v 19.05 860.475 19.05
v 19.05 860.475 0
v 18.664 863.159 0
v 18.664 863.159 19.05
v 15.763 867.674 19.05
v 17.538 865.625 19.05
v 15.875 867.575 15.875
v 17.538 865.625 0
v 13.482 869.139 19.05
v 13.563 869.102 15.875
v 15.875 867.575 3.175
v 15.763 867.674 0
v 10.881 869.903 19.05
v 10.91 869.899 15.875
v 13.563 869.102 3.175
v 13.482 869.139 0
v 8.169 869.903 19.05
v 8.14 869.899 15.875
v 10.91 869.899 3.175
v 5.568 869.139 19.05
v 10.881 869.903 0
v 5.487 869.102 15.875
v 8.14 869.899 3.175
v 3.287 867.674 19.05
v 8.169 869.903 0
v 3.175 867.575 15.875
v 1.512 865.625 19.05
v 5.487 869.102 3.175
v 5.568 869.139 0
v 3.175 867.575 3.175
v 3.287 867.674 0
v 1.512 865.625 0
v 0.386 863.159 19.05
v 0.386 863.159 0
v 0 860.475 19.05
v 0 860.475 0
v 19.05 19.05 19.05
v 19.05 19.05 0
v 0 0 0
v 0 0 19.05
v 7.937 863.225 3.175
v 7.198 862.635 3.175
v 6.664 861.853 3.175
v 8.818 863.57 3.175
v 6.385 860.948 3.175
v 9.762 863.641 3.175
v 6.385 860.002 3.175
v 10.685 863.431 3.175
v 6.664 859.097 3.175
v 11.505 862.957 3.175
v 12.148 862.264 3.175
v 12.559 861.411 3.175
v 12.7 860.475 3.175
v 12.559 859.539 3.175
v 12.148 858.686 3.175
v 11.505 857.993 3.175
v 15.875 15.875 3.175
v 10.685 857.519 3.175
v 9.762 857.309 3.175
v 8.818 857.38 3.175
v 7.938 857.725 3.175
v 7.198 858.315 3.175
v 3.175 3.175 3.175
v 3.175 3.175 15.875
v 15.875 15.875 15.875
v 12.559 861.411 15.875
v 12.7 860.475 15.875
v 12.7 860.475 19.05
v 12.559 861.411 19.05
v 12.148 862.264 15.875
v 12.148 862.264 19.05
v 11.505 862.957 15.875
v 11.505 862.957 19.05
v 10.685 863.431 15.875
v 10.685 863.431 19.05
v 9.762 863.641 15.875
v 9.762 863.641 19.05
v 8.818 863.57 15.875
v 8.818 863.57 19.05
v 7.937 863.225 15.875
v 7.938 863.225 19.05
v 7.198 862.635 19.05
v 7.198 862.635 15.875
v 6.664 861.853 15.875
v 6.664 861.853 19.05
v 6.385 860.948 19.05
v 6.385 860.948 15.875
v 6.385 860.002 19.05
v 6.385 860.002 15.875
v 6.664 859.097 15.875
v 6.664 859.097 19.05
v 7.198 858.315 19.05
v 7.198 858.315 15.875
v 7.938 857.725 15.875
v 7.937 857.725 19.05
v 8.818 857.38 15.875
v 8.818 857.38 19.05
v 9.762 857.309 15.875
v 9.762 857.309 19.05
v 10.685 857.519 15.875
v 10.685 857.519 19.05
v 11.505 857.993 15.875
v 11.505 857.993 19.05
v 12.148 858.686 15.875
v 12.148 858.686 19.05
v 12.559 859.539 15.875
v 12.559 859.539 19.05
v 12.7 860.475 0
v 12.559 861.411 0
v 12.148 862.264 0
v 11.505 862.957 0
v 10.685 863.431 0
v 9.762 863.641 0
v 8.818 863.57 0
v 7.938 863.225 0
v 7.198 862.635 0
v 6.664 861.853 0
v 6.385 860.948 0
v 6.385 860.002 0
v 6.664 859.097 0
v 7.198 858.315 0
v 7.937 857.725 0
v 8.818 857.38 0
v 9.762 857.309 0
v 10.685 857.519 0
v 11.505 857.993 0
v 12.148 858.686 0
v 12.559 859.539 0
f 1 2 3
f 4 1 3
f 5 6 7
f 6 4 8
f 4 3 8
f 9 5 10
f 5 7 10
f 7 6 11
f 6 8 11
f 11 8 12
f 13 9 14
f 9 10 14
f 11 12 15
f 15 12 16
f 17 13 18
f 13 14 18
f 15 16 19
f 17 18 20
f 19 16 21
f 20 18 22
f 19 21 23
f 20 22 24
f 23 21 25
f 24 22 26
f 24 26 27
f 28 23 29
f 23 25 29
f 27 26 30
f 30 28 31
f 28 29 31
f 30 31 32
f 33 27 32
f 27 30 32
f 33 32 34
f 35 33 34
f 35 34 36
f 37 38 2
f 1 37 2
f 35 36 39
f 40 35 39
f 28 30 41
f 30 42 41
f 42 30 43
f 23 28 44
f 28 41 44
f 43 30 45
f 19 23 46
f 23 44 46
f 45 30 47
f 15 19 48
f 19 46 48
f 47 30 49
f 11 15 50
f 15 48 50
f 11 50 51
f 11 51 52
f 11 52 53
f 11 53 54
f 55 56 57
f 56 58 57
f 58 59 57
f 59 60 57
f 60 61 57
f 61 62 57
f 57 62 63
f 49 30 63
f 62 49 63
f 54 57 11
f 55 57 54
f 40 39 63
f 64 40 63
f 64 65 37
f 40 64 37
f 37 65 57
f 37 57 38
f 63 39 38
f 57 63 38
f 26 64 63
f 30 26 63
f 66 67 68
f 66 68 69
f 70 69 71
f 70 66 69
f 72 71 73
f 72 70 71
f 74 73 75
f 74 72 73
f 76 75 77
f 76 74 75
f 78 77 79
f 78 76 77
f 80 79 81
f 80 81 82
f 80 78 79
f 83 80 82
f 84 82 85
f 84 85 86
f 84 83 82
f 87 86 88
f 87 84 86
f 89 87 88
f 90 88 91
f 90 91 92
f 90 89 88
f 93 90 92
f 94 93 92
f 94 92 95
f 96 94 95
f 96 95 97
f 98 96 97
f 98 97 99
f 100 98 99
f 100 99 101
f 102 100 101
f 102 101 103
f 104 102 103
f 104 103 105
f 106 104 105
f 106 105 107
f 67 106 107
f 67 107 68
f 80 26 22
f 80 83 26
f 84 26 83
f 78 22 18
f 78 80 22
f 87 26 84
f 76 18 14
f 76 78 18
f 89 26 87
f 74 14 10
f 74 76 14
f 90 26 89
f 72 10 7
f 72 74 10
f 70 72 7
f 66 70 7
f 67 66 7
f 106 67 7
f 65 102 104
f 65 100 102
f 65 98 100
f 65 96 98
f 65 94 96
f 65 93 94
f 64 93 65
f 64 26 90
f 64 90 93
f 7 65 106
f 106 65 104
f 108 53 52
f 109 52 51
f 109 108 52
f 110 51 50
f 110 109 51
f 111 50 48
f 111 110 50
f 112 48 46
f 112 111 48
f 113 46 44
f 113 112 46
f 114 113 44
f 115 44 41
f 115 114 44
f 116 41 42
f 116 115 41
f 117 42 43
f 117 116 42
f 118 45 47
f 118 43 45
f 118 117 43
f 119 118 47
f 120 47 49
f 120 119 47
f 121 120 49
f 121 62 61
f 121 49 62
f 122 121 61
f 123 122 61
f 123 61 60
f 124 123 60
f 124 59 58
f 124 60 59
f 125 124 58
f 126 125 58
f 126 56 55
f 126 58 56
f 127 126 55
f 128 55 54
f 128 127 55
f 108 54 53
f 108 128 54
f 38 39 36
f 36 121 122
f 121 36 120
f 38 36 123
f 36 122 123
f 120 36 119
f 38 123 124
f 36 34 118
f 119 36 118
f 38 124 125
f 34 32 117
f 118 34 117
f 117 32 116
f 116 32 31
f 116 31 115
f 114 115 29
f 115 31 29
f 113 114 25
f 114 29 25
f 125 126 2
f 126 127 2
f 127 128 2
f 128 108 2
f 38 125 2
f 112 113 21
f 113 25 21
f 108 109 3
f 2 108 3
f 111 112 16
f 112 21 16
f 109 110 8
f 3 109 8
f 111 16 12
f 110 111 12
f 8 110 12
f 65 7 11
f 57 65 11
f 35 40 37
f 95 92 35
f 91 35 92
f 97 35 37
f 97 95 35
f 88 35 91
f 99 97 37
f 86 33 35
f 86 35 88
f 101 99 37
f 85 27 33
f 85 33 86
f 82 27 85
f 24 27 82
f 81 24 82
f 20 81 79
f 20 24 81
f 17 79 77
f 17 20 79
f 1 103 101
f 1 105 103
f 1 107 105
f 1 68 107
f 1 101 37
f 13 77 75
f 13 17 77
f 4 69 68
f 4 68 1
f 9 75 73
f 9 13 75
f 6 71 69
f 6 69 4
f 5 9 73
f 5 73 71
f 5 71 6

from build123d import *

# Parameters (mm, degrees)
ESQUISSE1_R             = 3.175
BOSS_EXTRU_1_DEPTH      = 19.05
ESQUISSE2_W             = 12.7
ESQUISSE2_H             = 12.7
ENL_V_MAT_EXTRU_3_DEPTH = 871


with BuildPart() as part:
    # Esquisse1 → Boss.-Extru.1 (new body)
    with BuildSketch(Plane.XY):
        with BuildLine():
            Line((0, 0), (19.05, 19.05))
            Line((19.05, 19.05), (19.05, 860.475))
            ThreePointArc((19.05, 860.475), (9.525, 870), (0, 860.475))
            Line((0, 860.475), (0, 0))
        make_face()
        with Locations((9.525, 860.475)):
            Circle(ESQUISSE1_R, mode=Mode.SUBTRACT)
    extrude(amount=BOSS_EXTRU_1_DEPTH)

    # Esquisse2 → Enlèv. mat.-Extru.3 (cut, through all)
    with BuildSketch(Plane(origin=(0, 0, 0), x_dir=(1, 0, 0), z_dir=(0, 1, 0))):
        with Locations((9.525, -9.525)):
            Rectangle(ESQUISSE2_W, ESQUISSE2_H)
    extrude(amount=ENL_V_MAT_EXTRU_3_DEPTH, mode=Mode.SUBTRACT)


solid = part.part
